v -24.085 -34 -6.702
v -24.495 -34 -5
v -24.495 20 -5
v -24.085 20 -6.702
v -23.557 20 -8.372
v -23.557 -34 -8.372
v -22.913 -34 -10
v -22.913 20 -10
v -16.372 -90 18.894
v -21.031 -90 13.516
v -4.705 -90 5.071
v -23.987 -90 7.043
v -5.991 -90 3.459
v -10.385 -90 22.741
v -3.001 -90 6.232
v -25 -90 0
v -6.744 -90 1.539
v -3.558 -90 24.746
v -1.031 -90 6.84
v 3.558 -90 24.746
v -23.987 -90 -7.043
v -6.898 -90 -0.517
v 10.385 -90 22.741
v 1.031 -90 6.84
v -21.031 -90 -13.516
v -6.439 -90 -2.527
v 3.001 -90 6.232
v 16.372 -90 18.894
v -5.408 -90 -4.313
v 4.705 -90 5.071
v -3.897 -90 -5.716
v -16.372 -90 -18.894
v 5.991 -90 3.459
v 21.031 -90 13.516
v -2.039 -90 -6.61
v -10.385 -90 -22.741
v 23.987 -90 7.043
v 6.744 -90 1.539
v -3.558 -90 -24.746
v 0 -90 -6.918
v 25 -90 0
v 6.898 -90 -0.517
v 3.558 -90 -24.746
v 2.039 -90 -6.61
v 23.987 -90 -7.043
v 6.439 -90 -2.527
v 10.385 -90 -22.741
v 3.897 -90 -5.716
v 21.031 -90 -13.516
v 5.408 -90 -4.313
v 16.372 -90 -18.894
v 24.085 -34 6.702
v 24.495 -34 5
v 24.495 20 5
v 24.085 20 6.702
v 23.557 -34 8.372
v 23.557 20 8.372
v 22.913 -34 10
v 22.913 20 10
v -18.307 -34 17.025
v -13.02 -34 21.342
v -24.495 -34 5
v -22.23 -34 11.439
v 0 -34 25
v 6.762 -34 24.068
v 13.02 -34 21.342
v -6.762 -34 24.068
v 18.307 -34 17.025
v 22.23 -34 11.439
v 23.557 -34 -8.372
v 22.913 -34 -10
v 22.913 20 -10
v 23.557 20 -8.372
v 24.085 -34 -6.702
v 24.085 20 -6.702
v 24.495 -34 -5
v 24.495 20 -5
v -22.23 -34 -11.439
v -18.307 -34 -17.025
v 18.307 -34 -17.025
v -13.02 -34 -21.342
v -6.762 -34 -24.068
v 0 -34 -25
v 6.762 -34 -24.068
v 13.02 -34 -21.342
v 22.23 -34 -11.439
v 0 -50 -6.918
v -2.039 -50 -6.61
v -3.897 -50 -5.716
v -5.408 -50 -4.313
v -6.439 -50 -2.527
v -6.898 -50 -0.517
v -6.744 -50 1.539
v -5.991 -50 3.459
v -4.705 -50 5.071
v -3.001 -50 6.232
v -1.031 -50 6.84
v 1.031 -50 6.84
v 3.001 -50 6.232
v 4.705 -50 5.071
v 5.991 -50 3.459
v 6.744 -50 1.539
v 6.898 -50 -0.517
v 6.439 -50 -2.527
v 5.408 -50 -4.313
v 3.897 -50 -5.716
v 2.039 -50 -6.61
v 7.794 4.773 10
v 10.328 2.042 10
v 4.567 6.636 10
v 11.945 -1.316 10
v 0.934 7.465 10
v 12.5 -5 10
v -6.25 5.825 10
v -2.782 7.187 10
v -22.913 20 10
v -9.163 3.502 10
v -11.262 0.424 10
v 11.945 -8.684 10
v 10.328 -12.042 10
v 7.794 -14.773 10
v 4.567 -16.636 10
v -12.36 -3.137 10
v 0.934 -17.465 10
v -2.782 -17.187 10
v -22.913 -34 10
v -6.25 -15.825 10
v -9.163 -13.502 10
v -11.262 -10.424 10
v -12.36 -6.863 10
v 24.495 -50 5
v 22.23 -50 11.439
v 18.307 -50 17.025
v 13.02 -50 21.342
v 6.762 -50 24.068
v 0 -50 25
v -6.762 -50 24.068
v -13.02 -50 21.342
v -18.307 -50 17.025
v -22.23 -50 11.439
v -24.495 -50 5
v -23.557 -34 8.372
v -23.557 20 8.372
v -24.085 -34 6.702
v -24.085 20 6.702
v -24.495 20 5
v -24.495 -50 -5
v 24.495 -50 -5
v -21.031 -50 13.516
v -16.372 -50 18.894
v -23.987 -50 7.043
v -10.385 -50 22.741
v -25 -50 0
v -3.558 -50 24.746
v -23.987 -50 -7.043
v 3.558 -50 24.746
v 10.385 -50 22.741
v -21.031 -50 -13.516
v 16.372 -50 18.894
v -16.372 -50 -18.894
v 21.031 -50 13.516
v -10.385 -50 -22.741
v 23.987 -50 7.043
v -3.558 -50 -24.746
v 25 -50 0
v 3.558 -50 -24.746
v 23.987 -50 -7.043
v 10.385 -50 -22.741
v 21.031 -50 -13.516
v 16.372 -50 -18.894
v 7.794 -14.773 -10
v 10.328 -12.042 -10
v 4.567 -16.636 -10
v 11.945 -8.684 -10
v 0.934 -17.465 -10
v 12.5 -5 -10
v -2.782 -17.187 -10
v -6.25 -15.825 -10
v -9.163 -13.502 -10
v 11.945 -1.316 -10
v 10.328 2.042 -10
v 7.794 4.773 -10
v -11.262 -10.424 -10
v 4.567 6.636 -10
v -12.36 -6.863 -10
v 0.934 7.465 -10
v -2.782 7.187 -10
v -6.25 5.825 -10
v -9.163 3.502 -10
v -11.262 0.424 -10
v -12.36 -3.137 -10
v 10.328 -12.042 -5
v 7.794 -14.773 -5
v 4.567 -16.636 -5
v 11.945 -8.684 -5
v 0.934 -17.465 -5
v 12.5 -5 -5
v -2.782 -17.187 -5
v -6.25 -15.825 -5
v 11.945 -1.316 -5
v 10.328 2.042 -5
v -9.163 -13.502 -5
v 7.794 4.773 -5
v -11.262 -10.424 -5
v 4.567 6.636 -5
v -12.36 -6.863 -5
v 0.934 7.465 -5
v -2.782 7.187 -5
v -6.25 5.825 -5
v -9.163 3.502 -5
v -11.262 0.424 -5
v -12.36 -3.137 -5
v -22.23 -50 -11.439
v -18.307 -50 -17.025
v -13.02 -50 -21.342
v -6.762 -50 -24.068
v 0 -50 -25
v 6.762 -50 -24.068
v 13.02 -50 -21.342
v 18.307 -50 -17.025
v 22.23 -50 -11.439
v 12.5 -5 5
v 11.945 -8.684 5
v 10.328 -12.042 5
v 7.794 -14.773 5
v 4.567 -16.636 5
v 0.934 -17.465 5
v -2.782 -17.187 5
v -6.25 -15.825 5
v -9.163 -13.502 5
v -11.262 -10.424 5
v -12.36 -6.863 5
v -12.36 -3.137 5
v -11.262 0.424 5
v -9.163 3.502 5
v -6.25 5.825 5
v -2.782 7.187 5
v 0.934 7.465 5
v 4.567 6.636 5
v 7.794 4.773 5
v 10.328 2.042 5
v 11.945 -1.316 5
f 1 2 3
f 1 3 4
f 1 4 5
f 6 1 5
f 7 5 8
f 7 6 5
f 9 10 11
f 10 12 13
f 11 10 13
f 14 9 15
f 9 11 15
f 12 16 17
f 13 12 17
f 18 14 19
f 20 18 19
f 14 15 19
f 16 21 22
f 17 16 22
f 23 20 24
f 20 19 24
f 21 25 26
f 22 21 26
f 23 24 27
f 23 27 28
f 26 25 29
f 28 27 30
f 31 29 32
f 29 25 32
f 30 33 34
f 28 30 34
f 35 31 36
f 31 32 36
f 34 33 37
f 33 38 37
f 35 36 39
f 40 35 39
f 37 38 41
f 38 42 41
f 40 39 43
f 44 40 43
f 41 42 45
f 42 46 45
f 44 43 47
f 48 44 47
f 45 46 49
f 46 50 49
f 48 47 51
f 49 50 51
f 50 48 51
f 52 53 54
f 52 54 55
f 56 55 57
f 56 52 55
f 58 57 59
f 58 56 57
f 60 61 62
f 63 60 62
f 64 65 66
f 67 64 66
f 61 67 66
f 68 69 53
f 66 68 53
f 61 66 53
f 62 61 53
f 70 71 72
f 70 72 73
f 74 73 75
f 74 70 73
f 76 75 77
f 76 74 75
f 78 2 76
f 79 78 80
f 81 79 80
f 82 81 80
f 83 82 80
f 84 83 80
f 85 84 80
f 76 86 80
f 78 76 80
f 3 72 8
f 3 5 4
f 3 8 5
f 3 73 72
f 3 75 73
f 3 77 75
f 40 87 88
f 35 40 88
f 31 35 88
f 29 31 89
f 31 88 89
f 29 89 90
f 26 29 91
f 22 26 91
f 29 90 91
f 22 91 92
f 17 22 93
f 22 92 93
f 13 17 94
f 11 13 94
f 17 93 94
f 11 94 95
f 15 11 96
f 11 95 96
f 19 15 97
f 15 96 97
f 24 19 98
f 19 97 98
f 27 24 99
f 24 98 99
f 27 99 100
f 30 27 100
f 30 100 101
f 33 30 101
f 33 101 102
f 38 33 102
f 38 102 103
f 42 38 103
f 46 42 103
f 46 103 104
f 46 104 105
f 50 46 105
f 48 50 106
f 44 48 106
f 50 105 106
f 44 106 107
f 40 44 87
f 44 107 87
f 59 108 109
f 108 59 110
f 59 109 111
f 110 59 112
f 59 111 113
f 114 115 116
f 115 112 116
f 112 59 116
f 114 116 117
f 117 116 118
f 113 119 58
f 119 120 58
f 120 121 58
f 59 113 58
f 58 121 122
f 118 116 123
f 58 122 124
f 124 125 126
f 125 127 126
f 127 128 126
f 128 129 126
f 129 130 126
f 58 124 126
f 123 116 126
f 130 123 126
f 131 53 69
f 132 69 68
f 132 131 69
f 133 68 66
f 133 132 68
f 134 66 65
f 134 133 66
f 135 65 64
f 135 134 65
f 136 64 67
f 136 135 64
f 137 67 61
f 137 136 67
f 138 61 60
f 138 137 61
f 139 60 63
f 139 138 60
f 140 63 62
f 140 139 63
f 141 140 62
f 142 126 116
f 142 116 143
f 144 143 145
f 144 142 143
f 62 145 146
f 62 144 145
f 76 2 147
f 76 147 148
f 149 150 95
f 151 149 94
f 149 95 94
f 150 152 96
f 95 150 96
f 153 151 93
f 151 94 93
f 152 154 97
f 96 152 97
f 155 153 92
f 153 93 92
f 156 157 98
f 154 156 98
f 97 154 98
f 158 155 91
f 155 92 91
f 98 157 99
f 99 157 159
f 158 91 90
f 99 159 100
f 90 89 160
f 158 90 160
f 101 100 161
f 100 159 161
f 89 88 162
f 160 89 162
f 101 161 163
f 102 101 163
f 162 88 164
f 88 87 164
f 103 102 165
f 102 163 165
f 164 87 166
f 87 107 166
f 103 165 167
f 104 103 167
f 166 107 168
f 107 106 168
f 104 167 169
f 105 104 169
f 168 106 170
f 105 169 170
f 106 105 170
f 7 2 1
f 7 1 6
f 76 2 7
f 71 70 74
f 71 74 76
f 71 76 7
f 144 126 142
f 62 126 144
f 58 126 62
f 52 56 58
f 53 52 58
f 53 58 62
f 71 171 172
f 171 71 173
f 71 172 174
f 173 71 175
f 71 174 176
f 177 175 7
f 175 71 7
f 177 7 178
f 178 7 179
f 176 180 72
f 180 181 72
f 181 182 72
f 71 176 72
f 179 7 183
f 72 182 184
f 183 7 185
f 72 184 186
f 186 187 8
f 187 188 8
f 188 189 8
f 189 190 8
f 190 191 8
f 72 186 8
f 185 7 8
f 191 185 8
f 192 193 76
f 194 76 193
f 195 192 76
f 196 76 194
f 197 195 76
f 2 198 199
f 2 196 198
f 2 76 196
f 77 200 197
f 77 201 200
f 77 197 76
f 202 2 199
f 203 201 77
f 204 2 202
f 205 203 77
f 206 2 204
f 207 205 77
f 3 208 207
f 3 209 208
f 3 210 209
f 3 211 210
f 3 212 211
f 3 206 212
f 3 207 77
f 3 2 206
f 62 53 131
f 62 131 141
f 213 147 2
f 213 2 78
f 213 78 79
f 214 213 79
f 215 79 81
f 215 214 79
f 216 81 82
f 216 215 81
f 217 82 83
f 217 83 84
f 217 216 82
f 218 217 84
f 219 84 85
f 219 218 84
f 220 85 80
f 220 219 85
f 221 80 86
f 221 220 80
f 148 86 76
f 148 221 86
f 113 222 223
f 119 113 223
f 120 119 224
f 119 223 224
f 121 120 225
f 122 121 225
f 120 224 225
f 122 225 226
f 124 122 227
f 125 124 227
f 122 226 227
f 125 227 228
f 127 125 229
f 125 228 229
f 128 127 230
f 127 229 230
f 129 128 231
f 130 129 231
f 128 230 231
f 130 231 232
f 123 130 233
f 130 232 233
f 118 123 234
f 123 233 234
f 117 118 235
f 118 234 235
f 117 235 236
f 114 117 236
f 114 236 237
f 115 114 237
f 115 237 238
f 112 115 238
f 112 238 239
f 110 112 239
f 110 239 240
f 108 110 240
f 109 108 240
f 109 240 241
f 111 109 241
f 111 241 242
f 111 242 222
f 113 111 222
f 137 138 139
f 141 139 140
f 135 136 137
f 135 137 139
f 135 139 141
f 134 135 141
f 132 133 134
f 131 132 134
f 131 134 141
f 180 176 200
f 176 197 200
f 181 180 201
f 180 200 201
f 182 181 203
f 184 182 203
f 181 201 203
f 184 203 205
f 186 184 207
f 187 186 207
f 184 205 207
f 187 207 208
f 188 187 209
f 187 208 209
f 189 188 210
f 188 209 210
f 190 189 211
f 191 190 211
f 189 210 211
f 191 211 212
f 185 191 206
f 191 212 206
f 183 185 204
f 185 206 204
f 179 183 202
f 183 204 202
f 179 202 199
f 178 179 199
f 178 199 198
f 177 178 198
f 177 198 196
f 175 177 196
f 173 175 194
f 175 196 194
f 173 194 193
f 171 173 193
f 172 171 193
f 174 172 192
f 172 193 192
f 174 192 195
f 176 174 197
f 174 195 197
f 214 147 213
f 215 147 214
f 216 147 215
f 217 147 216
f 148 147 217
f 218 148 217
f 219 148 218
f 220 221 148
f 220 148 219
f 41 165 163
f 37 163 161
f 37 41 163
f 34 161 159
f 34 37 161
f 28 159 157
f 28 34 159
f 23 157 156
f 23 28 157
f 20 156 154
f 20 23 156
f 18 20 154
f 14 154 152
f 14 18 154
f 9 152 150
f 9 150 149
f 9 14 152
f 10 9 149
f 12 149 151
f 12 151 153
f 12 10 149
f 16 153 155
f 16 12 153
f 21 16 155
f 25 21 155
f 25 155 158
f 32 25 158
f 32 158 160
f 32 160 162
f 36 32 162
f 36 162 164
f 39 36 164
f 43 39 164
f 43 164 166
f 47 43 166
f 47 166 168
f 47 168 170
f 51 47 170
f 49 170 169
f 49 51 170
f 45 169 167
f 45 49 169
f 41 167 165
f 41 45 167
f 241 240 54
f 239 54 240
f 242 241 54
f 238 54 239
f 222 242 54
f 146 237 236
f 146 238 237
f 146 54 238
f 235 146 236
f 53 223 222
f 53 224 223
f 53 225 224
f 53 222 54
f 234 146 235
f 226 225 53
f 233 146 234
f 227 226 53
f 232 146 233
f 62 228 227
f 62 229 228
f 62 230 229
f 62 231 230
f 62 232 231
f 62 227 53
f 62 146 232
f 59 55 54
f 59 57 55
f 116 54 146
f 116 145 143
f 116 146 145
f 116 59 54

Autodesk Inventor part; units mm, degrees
ref_plane "YZ Plane" through (0, 0, 0) normal (1, 0, 0) x (0, 1, 0)
ref_plane "XZ Plane" through (0, 0, 0) normal (0, 1, 0) x (-1, 0, 0)
ref_plane "XY Plane" through (0, 0, 0) normal (0, 0, 1) x (1, 0, 0)
sketch "Szkic2" plane through (0, 0, 0) normal (0, 1, 0) x (-1, 0, 0)
  circle A0 centre (0, 0) radius 25
  line L0 (0, 0) -> (-25, 0)
  line L1 (0, 0) -> (25, 0)
extrude "Wyciągnięcie proste1" add sketch "Szkic2" along normal blind 20 and the other way blind 50
sketch "Szkic3" plane through (0, 20, 0) normal (0, 1, 0) x (1, 0, 0)
  circle A0 centre (0, 0) radius 25 projected
  line L0 (0, 0) -> (0, -25)
ref_plane "Płaszczyzna konstrukcyjna2" through (0, 20, 0) normal (0, 0, 1) x (1, 0, 0)
sketch "Szkic4" plane through (0, 20, 0) normal (0, 0, 1) x (1, 0, 0)
  circle A0 centre (0, -25) radius 12.5
  point P0 (0, -20)
  dimension "d6" = 25
extrude "Wyciągnięcie proste2" cut sketch "Szkic4" along normal through all both and the other way through all
sketch "Szkic5" plane through (0, 20, 0) normal (0, 0, 1) x (1, 0, 0)
  point P0 (0, -20)
sketch "Szkic6" plane through (0, 20, 0) normal (0, 1, 0) x (1, 0, 0)
  line L0 (0, 0) -> (24.7645, 0) construction
ref_plane "Płaszczyzna konstrukcyjna3" through (0, 20, 0) normal (1, 0, 0) x (0, 1, 0)
ref_plane "Płaszczyzna konstrukcyjna4" through (0, -34, 0) normal (0, -1, 0) x (1, 0, 0)
split body "Podział3" result two bodies by plane through (0, -34, 0) normal (0, -1, 0) first body at (-24.1827, -39.3333, 3.9301)
sketch "Szkic9" plane through (0, 20, 0) normal (0, 1, 0) x (1, 0, 0)
  point P0 (0, 0)
sketch "Szkic10" plane through (0, 20, 0) normal (1, 0, 0) x (0, 1, 0)
  line L0 (0, -25) -> (0, 25) projected
  line L1 (-54, -25) -> (-54, 25) projected
  line L2 (0, 5) -> (-54, 5)
  line L3 (-54, 5) -> (-54, -5)
  line L4 (-54, -5) -> (0, -5)
  line L5 (0, -5) -> (0, 5)
  point P0 (-20, 0)
  dimension "d13" = 10
extrude "Wyciągnięcie proste3" cut sketch "Szkic10" along normal through all both and the other way through all bodies 3
sketch "Szkic11" plane through (0, 20, 0) normal (1, 0, 0) x (0, 1, 0)
  line L0 (0, 10) -> (-55.9013, 10)
  line L1 (-55.9013, 10) -> (-55.9013, -10)
  line L2 (-55.9013, -10) -> (0, -10)
  line L3 (0, -10) -> (0, 10)
  point P0 (-20, 0)
extrude "Wyciągnięcie proste4" cut sketch "Szkic11" along normal through all both and the other way through all keep common part bodies 3
ref_plane "Płaszczyzna konstrukcyjna5" through (0, -50, 0) normal (0, -1, 0) x (1, 0, 0)
extrude "Wyciągnięcie proste5" add sketch "Szkic3" against normal blind 40 from surface at -70 bodies 2
split body "Podział4" result two bodies by plane through (0, -50, 0) normal (0, -1, 0) bodies 2 first body at (24.4206, -76.6667, 1.9714)
ref_plane "Płaszczyzna konstrukcyjna6" through (-24.4949, 20, 0) normal (0, 0, 1) x (1, 0, 0)
sketch "Szkic13" plane through (0, -50, 0) normal (0, 1, 0) x (1, 0, 0)
  point P0 (0, 0)
sketch "Szkic15" plane through (0, -90, 0) normal (0, -1, 0) x (1, 0, 0)
  point P0 (0, 0)
  point P1 (0, 0)
hole "Otwór1" at (0, -90, 0) at (0, -90, 0) direction (0, 1, 0) diameter 13.835 depth 41.3 tip angle 118 bodies 4 thread size "M16x2" class "6H" standard "ISO Metric profile"
sketch "Szkic16" plane through (0, -34, 0) normal (0, 1, 0) x (1, 0, 0)
  line L0 (-27.4441, 5) -> (27.8595, 5)
  line L1 (27.8595, 5) -> (27.8595, -5)
  line L2 (27.8595, -5) -> (-27.4441, -5)
  line L3 (-27.4441, -5) -> (-27.4441, 5)
  point P0 (0, 0)
extrude "Wyciągnięcie proste8" cut sketch "Szkic16" against normal blind 20 bodies 5
properties part number "przegub"
